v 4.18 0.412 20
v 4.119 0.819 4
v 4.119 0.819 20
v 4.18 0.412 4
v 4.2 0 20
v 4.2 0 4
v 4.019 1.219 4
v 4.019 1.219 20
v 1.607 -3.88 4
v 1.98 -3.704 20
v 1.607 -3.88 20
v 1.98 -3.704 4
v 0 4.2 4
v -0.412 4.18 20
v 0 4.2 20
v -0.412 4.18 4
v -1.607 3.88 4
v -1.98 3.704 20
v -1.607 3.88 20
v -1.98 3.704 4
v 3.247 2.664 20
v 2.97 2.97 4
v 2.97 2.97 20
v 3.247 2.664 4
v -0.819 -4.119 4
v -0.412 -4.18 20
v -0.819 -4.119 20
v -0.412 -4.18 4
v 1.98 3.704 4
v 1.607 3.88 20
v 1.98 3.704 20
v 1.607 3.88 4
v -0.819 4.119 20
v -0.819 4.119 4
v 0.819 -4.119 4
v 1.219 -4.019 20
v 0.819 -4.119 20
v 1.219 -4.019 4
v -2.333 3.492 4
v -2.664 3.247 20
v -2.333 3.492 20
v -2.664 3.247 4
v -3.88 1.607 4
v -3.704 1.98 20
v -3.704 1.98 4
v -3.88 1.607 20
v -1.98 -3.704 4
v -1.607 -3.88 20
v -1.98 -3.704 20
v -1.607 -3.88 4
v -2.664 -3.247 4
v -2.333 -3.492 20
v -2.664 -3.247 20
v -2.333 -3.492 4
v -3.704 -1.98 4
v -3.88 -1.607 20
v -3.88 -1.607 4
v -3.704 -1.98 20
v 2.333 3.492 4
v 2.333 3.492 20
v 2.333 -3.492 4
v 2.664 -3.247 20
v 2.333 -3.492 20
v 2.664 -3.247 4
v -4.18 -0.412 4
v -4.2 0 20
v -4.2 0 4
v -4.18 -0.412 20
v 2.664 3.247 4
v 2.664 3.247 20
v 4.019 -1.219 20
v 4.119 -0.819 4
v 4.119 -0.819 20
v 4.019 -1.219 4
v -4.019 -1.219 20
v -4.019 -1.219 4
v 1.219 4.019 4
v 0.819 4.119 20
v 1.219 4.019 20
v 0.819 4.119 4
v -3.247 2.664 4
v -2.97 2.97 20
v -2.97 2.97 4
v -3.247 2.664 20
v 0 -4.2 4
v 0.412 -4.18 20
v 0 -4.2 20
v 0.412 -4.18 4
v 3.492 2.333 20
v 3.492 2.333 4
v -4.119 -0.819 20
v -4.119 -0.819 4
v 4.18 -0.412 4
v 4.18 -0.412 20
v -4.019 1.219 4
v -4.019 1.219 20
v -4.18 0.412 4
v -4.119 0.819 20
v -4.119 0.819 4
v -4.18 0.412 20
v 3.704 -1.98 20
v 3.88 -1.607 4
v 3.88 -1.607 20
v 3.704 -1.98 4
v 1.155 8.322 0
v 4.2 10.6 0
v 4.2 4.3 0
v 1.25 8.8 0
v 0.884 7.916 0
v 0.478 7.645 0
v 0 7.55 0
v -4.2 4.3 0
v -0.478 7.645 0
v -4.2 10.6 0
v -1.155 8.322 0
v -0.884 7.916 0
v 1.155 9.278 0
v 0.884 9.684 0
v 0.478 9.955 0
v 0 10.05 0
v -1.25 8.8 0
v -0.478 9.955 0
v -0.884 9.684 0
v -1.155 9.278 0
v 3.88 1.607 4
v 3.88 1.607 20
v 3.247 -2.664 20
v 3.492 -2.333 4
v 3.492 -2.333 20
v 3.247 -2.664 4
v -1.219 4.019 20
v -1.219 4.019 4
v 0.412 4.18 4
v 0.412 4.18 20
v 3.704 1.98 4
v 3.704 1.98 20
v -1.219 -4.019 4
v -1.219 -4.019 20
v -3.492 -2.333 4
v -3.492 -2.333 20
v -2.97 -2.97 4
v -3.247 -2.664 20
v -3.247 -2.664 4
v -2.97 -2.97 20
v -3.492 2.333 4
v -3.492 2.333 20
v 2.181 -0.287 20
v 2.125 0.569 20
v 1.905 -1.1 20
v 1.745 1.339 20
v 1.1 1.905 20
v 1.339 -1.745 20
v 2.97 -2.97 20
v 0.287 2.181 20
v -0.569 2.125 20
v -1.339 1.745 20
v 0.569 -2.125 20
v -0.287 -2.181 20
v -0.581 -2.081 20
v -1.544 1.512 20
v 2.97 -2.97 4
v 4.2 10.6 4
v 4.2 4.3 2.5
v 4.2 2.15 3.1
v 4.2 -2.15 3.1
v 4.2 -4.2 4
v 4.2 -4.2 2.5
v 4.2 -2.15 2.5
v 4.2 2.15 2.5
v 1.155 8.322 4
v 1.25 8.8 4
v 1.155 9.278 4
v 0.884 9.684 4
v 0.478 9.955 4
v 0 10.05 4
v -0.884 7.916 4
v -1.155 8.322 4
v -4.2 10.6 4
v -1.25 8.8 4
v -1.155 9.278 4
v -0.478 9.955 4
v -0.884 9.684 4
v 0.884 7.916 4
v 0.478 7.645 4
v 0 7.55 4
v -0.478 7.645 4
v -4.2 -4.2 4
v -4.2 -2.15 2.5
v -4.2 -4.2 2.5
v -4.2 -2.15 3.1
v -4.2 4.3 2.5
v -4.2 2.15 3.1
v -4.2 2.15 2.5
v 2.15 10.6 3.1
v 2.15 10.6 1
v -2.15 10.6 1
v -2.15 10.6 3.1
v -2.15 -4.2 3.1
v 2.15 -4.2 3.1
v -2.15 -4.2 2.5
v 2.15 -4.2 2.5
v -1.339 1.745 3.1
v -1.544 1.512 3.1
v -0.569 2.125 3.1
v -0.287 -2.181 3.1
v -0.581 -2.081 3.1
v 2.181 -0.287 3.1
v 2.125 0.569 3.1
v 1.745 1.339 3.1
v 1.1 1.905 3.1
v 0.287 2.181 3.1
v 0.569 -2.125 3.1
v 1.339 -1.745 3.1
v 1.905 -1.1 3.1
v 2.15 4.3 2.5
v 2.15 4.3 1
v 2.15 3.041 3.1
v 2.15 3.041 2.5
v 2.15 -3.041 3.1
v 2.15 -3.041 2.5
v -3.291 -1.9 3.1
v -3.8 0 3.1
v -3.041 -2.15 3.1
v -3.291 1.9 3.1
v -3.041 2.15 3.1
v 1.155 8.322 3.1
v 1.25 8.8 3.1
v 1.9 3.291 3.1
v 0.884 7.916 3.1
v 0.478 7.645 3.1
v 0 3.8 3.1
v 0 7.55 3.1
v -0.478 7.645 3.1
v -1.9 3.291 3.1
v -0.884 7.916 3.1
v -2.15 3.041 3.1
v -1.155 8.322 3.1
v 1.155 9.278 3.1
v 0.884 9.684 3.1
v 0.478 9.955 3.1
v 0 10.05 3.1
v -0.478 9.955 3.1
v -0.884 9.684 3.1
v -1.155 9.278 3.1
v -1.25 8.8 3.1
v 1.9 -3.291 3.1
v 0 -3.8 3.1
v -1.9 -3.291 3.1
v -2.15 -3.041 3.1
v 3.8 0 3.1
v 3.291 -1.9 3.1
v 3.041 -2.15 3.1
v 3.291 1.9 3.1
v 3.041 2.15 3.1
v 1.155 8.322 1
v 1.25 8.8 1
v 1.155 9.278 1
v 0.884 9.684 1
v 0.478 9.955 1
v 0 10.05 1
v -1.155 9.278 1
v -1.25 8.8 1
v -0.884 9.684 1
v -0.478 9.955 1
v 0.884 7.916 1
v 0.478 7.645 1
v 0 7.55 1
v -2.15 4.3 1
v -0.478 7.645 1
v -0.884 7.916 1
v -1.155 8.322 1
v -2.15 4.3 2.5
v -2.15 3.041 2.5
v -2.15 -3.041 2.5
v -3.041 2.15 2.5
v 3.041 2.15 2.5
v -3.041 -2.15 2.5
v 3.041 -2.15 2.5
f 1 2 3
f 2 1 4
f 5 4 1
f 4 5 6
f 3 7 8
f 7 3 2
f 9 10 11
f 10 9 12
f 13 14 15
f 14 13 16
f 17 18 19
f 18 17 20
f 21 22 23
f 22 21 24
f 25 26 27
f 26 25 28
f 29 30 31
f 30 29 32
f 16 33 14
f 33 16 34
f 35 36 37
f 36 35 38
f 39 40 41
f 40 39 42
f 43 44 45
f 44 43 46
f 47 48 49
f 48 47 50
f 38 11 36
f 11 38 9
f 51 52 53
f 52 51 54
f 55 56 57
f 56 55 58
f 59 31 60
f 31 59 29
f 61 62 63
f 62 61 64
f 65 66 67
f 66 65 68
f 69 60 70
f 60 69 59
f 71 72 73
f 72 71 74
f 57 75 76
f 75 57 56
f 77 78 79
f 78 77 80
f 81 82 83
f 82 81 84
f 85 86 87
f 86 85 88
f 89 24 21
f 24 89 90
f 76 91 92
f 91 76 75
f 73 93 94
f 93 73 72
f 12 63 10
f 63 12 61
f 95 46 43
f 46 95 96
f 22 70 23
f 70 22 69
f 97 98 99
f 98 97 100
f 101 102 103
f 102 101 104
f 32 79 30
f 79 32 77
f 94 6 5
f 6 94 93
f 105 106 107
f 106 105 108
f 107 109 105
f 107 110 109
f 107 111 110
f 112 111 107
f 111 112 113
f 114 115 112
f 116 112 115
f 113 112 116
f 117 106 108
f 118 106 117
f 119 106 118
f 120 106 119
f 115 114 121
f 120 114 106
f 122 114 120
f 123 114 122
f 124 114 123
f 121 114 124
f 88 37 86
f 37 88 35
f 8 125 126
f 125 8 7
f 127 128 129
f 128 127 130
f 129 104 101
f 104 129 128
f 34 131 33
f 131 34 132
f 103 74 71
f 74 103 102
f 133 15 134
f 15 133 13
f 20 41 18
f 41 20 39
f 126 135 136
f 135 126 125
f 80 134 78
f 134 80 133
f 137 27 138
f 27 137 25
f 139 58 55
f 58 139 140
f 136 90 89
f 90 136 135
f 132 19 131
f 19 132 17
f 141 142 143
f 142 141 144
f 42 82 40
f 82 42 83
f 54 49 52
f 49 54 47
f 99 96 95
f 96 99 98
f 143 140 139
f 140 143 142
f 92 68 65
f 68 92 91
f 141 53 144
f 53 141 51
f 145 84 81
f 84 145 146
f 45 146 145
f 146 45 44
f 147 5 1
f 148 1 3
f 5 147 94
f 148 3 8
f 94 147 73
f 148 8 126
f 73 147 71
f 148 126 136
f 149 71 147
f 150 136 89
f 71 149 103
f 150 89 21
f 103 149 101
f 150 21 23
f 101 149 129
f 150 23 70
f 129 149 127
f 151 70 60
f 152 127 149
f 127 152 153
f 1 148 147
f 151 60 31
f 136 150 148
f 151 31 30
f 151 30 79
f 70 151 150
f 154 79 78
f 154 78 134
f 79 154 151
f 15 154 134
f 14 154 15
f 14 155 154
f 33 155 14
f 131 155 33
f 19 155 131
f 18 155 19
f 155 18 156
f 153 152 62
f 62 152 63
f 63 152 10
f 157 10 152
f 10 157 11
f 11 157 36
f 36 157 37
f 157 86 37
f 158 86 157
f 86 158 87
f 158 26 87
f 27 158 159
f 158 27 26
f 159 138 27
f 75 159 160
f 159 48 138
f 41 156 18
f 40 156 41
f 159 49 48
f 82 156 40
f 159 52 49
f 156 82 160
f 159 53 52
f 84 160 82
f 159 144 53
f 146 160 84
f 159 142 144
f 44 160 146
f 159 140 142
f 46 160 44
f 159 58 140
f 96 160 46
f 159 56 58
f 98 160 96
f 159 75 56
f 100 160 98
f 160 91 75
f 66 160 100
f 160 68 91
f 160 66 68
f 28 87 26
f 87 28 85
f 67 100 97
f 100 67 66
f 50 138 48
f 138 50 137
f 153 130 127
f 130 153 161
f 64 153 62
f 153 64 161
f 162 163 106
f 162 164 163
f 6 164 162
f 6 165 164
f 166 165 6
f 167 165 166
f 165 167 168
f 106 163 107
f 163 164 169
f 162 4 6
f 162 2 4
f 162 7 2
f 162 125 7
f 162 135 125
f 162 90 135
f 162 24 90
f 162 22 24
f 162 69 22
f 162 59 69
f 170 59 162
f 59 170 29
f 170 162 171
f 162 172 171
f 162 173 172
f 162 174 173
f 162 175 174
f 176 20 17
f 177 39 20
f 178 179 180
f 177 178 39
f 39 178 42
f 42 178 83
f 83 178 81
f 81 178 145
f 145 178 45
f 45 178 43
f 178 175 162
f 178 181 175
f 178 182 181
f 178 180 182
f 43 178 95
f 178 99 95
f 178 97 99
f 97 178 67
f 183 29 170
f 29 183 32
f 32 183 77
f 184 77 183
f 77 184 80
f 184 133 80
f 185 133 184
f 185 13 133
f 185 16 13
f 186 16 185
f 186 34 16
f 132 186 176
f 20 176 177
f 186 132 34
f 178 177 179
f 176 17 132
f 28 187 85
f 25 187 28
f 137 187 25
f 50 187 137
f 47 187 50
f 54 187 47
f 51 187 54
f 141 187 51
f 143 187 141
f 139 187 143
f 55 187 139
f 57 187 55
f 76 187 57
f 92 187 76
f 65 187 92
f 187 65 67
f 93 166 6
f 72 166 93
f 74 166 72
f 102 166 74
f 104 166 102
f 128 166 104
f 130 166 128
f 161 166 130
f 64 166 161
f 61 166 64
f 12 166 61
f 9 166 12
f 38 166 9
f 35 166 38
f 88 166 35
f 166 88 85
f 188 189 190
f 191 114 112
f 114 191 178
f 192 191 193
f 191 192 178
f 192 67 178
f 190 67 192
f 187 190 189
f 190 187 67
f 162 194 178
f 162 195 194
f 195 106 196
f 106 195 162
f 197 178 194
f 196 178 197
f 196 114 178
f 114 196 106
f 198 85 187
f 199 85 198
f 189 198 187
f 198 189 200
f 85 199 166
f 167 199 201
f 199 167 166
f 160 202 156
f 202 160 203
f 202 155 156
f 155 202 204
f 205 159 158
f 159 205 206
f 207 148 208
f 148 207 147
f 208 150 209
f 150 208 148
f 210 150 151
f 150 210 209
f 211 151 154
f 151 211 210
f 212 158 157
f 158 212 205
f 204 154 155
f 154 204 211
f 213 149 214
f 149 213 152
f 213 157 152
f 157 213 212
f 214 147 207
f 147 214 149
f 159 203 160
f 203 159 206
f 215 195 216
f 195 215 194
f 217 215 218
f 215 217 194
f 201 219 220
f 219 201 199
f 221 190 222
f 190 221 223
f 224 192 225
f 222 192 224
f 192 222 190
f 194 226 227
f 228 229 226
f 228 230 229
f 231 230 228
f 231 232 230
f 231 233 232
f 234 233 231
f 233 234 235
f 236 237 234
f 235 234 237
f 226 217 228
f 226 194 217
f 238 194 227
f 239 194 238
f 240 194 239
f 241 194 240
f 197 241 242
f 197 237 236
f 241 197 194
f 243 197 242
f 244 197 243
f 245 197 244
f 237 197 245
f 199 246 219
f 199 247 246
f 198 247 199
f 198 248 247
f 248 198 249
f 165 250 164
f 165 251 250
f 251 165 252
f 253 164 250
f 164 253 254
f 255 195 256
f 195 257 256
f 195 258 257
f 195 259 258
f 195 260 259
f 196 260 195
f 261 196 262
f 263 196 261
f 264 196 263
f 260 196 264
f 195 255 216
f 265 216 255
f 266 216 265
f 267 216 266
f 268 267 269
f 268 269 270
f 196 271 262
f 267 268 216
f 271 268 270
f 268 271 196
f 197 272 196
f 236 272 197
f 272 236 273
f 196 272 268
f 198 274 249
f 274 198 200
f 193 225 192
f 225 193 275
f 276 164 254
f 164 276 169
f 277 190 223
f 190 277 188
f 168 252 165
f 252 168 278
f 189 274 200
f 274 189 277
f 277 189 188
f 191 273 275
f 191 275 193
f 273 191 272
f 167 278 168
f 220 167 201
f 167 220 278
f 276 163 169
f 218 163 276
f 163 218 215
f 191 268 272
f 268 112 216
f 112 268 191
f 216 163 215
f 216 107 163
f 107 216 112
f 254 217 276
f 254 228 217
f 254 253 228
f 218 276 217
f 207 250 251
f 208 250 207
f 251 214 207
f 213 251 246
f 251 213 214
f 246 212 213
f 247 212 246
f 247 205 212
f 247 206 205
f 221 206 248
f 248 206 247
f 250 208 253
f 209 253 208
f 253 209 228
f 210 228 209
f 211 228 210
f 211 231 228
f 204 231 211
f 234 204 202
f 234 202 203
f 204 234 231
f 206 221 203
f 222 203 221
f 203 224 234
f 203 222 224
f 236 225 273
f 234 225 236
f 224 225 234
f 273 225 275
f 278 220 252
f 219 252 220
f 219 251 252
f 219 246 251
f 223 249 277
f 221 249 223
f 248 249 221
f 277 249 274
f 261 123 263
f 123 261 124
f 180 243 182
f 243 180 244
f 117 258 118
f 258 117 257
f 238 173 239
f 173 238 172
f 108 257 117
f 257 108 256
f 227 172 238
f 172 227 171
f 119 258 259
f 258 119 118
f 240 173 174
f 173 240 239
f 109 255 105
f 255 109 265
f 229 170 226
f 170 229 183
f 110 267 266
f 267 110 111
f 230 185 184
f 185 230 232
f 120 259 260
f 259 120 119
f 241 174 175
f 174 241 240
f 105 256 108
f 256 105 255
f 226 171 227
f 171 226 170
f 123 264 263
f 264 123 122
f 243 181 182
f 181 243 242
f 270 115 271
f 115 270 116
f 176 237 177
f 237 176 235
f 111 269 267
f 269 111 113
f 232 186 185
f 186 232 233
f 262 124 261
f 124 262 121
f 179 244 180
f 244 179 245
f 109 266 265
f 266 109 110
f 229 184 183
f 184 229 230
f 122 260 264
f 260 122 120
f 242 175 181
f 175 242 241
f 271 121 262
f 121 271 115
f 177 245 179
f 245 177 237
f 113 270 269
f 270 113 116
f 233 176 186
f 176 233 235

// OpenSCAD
d1=4.4;
d2= 3;
t=2;
hei=20;
aw=4.3;
al=12+((d1+(t*2))/3);
at=2.1;
hole=8.8;


difference() {
    union() {
        cylinder(d=d1+(t*2), h=hei, $fn=64);
        translate([-(d1+(t*2))/2, -(d1+(t*2))/2,0]) {
            cube([d1+(t*2),al,t*2]);
        }
    }
    rotate([0,0,105]) {
        difference() {
            cylinder(d=d1, h=hei,$fn=16);
            translate([-d1/2,d1/4,0]) {
                cube([d1,d1,hei]);
            }
        }
    }
  
    translate([0,0,(at/2)+t/2]) {  
        cube([aw,100,at], center=true);
        cube([100,aw,at], center=true);
    }
    translate([0,hole,0]) {
        cylinder(d=2.5,h=10,$fn=16);
    }
    translate([0,0,1]) {
        cube([aw*2,aw*2,3],center=true);
        cylinder(d=7.6,h=at);
    }
}
